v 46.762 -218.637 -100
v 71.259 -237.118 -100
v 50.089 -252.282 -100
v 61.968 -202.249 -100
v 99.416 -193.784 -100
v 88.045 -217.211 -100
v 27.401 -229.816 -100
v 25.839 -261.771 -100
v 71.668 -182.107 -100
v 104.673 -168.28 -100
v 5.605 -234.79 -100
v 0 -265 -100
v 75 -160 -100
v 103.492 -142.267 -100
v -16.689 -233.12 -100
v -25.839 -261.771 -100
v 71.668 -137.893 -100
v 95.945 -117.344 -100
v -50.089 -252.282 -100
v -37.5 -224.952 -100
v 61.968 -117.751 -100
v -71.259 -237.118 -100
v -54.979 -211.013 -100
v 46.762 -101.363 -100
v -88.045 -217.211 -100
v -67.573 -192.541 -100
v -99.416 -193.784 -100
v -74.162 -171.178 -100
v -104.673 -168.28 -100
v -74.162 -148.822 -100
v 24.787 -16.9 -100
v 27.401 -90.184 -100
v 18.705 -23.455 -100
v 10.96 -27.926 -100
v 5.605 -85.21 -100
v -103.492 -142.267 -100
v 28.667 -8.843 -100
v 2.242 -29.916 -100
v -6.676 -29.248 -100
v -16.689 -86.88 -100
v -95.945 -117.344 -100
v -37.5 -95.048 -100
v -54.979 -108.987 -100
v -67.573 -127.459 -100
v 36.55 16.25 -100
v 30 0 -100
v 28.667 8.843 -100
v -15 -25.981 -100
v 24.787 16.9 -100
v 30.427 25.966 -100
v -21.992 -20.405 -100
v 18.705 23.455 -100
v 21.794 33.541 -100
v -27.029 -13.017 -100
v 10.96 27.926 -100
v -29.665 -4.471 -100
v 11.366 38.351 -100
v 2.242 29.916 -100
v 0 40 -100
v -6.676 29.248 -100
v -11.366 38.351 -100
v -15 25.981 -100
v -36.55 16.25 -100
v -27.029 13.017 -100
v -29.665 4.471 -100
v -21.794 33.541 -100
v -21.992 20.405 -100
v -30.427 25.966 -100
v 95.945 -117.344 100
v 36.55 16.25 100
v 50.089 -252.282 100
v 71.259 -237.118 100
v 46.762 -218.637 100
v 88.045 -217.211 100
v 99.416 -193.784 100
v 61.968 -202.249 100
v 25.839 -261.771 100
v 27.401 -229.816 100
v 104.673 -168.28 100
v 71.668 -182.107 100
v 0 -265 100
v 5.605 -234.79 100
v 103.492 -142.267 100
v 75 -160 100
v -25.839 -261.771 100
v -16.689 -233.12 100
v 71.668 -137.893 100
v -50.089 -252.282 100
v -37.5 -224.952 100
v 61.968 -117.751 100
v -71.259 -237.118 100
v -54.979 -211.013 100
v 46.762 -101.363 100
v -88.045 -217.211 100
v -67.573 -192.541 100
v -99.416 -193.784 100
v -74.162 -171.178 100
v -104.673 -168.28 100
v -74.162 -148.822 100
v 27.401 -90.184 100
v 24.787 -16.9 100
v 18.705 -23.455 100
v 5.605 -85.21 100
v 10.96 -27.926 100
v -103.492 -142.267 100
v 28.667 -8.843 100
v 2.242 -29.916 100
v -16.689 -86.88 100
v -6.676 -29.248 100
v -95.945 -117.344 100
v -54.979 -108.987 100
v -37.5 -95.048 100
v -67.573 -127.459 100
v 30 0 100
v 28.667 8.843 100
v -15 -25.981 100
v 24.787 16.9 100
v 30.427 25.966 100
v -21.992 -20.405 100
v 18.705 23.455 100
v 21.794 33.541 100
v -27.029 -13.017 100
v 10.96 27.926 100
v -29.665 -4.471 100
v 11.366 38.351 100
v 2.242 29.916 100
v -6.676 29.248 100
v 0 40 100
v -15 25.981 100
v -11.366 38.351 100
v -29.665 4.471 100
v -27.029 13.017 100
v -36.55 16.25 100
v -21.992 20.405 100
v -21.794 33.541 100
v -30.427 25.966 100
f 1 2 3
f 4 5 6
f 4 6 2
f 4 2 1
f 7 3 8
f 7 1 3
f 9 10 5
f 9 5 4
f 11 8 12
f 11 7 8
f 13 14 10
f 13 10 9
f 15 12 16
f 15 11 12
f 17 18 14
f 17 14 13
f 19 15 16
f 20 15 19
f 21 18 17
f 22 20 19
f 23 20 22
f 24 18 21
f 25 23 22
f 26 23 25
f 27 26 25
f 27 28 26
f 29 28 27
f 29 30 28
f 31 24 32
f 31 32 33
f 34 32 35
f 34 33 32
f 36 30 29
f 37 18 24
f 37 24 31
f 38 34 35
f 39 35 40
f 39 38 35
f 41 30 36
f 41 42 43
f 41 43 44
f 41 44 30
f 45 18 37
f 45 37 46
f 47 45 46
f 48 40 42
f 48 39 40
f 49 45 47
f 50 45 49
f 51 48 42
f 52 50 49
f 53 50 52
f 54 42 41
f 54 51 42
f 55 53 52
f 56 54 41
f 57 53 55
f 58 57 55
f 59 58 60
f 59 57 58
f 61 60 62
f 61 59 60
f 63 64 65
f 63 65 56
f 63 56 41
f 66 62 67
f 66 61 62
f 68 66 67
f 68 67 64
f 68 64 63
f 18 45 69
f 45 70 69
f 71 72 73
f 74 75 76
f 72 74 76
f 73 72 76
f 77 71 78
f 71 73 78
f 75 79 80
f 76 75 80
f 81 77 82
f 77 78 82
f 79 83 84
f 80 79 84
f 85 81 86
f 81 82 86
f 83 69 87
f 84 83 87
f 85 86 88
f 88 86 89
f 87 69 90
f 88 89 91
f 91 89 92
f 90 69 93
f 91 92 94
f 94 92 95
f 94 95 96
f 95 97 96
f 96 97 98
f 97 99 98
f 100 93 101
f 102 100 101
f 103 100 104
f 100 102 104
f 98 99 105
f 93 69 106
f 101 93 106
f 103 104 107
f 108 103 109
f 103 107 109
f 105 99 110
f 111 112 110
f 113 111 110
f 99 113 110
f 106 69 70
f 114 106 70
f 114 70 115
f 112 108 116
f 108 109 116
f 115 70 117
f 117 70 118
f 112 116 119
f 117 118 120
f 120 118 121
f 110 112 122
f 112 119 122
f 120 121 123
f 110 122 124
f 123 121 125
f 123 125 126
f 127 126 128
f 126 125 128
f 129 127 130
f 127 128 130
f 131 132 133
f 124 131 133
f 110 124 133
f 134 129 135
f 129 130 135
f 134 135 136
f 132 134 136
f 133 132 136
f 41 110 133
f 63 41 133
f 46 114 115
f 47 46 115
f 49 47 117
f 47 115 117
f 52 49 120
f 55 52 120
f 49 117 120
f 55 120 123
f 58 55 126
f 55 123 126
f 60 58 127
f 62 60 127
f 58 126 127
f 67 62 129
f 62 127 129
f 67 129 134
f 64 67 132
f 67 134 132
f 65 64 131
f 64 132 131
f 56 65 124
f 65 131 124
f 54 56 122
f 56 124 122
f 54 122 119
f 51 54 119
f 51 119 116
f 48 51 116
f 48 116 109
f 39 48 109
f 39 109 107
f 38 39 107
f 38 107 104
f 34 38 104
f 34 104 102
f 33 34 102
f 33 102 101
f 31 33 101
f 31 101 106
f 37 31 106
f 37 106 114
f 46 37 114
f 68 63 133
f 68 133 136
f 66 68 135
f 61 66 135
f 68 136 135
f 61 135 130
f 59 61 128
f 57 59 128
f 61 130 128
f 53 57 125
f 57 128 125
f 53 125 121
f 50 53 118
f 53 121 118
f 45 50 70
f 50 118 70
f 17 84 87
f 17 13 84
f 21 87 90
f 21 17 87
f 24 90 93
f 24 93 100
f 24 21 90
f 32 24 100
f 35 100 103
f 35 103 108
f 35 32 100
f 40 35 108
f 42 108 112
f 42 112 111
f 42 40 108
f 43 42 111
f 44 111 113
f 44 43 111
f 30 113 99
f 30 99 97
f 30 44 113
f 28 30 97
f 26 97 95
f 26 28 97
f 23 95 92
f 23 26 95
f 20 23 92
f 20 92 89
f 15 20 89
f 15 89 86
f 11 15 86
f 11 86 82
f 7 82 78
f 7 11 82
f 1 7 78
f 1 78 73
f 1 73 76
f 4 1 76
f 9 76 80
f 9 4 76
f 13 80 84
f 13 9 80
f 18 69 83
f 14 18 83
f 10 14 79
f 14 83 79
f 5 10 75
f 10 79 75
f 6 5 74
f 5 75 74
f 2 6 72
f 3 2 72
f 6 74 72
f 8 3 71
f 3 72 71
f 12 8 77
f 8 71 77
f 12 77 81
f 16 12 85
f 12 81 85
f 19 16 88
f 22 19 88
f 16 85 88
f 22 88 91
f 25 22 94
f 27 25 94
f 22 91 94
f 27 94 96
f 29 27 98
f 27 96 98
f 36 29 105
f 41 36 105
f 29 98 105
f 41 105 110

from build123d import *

# Parameters (mm, degrees)
SKETCH1_R           = 75
BOSS_EXTRUDE1_DEPTH = 100
SKETCH3_R           = 30
CUT_EXTRUDE2_DEPTH  = 349.20970693


with BuildPart() as part:
    # Sketch1 → Boss-Extrude1 (new, symmetric)
    with BuildSketch(Plane.XY):
        with BuildLine():
            Line((-95.945006832, -117.34375), (-36.550478793, 16.25))
            ThreePointArc((-36.550478793, 16.25), (0, 40), (36.550478793, 16.25))
            Line((36.550478793, 16.25), (95.945006832, -117.34375))
            ThreePointArc((95.945006832, -117.34375), (0, -265), (-95.945006832, -117.34375))
        make_face()
        with Locations((0, -160)):
            Circle(SKETCH1_R, mode=Mode.SUBTRACT)
    extrude(amount=BOSS_EXTRUDE1_DEPTH, both=True)

    # Sketch3 → Cut-Extrude2 (cut, through all)
    with BuildSketch(Plane.XY.offset(100)):
        Circle(SKETCH3_R)
    extrude(amount=-CUT_EXTRUDE2_DEPTH, mode=Mode.SUBTRACT)


solid = part.part
